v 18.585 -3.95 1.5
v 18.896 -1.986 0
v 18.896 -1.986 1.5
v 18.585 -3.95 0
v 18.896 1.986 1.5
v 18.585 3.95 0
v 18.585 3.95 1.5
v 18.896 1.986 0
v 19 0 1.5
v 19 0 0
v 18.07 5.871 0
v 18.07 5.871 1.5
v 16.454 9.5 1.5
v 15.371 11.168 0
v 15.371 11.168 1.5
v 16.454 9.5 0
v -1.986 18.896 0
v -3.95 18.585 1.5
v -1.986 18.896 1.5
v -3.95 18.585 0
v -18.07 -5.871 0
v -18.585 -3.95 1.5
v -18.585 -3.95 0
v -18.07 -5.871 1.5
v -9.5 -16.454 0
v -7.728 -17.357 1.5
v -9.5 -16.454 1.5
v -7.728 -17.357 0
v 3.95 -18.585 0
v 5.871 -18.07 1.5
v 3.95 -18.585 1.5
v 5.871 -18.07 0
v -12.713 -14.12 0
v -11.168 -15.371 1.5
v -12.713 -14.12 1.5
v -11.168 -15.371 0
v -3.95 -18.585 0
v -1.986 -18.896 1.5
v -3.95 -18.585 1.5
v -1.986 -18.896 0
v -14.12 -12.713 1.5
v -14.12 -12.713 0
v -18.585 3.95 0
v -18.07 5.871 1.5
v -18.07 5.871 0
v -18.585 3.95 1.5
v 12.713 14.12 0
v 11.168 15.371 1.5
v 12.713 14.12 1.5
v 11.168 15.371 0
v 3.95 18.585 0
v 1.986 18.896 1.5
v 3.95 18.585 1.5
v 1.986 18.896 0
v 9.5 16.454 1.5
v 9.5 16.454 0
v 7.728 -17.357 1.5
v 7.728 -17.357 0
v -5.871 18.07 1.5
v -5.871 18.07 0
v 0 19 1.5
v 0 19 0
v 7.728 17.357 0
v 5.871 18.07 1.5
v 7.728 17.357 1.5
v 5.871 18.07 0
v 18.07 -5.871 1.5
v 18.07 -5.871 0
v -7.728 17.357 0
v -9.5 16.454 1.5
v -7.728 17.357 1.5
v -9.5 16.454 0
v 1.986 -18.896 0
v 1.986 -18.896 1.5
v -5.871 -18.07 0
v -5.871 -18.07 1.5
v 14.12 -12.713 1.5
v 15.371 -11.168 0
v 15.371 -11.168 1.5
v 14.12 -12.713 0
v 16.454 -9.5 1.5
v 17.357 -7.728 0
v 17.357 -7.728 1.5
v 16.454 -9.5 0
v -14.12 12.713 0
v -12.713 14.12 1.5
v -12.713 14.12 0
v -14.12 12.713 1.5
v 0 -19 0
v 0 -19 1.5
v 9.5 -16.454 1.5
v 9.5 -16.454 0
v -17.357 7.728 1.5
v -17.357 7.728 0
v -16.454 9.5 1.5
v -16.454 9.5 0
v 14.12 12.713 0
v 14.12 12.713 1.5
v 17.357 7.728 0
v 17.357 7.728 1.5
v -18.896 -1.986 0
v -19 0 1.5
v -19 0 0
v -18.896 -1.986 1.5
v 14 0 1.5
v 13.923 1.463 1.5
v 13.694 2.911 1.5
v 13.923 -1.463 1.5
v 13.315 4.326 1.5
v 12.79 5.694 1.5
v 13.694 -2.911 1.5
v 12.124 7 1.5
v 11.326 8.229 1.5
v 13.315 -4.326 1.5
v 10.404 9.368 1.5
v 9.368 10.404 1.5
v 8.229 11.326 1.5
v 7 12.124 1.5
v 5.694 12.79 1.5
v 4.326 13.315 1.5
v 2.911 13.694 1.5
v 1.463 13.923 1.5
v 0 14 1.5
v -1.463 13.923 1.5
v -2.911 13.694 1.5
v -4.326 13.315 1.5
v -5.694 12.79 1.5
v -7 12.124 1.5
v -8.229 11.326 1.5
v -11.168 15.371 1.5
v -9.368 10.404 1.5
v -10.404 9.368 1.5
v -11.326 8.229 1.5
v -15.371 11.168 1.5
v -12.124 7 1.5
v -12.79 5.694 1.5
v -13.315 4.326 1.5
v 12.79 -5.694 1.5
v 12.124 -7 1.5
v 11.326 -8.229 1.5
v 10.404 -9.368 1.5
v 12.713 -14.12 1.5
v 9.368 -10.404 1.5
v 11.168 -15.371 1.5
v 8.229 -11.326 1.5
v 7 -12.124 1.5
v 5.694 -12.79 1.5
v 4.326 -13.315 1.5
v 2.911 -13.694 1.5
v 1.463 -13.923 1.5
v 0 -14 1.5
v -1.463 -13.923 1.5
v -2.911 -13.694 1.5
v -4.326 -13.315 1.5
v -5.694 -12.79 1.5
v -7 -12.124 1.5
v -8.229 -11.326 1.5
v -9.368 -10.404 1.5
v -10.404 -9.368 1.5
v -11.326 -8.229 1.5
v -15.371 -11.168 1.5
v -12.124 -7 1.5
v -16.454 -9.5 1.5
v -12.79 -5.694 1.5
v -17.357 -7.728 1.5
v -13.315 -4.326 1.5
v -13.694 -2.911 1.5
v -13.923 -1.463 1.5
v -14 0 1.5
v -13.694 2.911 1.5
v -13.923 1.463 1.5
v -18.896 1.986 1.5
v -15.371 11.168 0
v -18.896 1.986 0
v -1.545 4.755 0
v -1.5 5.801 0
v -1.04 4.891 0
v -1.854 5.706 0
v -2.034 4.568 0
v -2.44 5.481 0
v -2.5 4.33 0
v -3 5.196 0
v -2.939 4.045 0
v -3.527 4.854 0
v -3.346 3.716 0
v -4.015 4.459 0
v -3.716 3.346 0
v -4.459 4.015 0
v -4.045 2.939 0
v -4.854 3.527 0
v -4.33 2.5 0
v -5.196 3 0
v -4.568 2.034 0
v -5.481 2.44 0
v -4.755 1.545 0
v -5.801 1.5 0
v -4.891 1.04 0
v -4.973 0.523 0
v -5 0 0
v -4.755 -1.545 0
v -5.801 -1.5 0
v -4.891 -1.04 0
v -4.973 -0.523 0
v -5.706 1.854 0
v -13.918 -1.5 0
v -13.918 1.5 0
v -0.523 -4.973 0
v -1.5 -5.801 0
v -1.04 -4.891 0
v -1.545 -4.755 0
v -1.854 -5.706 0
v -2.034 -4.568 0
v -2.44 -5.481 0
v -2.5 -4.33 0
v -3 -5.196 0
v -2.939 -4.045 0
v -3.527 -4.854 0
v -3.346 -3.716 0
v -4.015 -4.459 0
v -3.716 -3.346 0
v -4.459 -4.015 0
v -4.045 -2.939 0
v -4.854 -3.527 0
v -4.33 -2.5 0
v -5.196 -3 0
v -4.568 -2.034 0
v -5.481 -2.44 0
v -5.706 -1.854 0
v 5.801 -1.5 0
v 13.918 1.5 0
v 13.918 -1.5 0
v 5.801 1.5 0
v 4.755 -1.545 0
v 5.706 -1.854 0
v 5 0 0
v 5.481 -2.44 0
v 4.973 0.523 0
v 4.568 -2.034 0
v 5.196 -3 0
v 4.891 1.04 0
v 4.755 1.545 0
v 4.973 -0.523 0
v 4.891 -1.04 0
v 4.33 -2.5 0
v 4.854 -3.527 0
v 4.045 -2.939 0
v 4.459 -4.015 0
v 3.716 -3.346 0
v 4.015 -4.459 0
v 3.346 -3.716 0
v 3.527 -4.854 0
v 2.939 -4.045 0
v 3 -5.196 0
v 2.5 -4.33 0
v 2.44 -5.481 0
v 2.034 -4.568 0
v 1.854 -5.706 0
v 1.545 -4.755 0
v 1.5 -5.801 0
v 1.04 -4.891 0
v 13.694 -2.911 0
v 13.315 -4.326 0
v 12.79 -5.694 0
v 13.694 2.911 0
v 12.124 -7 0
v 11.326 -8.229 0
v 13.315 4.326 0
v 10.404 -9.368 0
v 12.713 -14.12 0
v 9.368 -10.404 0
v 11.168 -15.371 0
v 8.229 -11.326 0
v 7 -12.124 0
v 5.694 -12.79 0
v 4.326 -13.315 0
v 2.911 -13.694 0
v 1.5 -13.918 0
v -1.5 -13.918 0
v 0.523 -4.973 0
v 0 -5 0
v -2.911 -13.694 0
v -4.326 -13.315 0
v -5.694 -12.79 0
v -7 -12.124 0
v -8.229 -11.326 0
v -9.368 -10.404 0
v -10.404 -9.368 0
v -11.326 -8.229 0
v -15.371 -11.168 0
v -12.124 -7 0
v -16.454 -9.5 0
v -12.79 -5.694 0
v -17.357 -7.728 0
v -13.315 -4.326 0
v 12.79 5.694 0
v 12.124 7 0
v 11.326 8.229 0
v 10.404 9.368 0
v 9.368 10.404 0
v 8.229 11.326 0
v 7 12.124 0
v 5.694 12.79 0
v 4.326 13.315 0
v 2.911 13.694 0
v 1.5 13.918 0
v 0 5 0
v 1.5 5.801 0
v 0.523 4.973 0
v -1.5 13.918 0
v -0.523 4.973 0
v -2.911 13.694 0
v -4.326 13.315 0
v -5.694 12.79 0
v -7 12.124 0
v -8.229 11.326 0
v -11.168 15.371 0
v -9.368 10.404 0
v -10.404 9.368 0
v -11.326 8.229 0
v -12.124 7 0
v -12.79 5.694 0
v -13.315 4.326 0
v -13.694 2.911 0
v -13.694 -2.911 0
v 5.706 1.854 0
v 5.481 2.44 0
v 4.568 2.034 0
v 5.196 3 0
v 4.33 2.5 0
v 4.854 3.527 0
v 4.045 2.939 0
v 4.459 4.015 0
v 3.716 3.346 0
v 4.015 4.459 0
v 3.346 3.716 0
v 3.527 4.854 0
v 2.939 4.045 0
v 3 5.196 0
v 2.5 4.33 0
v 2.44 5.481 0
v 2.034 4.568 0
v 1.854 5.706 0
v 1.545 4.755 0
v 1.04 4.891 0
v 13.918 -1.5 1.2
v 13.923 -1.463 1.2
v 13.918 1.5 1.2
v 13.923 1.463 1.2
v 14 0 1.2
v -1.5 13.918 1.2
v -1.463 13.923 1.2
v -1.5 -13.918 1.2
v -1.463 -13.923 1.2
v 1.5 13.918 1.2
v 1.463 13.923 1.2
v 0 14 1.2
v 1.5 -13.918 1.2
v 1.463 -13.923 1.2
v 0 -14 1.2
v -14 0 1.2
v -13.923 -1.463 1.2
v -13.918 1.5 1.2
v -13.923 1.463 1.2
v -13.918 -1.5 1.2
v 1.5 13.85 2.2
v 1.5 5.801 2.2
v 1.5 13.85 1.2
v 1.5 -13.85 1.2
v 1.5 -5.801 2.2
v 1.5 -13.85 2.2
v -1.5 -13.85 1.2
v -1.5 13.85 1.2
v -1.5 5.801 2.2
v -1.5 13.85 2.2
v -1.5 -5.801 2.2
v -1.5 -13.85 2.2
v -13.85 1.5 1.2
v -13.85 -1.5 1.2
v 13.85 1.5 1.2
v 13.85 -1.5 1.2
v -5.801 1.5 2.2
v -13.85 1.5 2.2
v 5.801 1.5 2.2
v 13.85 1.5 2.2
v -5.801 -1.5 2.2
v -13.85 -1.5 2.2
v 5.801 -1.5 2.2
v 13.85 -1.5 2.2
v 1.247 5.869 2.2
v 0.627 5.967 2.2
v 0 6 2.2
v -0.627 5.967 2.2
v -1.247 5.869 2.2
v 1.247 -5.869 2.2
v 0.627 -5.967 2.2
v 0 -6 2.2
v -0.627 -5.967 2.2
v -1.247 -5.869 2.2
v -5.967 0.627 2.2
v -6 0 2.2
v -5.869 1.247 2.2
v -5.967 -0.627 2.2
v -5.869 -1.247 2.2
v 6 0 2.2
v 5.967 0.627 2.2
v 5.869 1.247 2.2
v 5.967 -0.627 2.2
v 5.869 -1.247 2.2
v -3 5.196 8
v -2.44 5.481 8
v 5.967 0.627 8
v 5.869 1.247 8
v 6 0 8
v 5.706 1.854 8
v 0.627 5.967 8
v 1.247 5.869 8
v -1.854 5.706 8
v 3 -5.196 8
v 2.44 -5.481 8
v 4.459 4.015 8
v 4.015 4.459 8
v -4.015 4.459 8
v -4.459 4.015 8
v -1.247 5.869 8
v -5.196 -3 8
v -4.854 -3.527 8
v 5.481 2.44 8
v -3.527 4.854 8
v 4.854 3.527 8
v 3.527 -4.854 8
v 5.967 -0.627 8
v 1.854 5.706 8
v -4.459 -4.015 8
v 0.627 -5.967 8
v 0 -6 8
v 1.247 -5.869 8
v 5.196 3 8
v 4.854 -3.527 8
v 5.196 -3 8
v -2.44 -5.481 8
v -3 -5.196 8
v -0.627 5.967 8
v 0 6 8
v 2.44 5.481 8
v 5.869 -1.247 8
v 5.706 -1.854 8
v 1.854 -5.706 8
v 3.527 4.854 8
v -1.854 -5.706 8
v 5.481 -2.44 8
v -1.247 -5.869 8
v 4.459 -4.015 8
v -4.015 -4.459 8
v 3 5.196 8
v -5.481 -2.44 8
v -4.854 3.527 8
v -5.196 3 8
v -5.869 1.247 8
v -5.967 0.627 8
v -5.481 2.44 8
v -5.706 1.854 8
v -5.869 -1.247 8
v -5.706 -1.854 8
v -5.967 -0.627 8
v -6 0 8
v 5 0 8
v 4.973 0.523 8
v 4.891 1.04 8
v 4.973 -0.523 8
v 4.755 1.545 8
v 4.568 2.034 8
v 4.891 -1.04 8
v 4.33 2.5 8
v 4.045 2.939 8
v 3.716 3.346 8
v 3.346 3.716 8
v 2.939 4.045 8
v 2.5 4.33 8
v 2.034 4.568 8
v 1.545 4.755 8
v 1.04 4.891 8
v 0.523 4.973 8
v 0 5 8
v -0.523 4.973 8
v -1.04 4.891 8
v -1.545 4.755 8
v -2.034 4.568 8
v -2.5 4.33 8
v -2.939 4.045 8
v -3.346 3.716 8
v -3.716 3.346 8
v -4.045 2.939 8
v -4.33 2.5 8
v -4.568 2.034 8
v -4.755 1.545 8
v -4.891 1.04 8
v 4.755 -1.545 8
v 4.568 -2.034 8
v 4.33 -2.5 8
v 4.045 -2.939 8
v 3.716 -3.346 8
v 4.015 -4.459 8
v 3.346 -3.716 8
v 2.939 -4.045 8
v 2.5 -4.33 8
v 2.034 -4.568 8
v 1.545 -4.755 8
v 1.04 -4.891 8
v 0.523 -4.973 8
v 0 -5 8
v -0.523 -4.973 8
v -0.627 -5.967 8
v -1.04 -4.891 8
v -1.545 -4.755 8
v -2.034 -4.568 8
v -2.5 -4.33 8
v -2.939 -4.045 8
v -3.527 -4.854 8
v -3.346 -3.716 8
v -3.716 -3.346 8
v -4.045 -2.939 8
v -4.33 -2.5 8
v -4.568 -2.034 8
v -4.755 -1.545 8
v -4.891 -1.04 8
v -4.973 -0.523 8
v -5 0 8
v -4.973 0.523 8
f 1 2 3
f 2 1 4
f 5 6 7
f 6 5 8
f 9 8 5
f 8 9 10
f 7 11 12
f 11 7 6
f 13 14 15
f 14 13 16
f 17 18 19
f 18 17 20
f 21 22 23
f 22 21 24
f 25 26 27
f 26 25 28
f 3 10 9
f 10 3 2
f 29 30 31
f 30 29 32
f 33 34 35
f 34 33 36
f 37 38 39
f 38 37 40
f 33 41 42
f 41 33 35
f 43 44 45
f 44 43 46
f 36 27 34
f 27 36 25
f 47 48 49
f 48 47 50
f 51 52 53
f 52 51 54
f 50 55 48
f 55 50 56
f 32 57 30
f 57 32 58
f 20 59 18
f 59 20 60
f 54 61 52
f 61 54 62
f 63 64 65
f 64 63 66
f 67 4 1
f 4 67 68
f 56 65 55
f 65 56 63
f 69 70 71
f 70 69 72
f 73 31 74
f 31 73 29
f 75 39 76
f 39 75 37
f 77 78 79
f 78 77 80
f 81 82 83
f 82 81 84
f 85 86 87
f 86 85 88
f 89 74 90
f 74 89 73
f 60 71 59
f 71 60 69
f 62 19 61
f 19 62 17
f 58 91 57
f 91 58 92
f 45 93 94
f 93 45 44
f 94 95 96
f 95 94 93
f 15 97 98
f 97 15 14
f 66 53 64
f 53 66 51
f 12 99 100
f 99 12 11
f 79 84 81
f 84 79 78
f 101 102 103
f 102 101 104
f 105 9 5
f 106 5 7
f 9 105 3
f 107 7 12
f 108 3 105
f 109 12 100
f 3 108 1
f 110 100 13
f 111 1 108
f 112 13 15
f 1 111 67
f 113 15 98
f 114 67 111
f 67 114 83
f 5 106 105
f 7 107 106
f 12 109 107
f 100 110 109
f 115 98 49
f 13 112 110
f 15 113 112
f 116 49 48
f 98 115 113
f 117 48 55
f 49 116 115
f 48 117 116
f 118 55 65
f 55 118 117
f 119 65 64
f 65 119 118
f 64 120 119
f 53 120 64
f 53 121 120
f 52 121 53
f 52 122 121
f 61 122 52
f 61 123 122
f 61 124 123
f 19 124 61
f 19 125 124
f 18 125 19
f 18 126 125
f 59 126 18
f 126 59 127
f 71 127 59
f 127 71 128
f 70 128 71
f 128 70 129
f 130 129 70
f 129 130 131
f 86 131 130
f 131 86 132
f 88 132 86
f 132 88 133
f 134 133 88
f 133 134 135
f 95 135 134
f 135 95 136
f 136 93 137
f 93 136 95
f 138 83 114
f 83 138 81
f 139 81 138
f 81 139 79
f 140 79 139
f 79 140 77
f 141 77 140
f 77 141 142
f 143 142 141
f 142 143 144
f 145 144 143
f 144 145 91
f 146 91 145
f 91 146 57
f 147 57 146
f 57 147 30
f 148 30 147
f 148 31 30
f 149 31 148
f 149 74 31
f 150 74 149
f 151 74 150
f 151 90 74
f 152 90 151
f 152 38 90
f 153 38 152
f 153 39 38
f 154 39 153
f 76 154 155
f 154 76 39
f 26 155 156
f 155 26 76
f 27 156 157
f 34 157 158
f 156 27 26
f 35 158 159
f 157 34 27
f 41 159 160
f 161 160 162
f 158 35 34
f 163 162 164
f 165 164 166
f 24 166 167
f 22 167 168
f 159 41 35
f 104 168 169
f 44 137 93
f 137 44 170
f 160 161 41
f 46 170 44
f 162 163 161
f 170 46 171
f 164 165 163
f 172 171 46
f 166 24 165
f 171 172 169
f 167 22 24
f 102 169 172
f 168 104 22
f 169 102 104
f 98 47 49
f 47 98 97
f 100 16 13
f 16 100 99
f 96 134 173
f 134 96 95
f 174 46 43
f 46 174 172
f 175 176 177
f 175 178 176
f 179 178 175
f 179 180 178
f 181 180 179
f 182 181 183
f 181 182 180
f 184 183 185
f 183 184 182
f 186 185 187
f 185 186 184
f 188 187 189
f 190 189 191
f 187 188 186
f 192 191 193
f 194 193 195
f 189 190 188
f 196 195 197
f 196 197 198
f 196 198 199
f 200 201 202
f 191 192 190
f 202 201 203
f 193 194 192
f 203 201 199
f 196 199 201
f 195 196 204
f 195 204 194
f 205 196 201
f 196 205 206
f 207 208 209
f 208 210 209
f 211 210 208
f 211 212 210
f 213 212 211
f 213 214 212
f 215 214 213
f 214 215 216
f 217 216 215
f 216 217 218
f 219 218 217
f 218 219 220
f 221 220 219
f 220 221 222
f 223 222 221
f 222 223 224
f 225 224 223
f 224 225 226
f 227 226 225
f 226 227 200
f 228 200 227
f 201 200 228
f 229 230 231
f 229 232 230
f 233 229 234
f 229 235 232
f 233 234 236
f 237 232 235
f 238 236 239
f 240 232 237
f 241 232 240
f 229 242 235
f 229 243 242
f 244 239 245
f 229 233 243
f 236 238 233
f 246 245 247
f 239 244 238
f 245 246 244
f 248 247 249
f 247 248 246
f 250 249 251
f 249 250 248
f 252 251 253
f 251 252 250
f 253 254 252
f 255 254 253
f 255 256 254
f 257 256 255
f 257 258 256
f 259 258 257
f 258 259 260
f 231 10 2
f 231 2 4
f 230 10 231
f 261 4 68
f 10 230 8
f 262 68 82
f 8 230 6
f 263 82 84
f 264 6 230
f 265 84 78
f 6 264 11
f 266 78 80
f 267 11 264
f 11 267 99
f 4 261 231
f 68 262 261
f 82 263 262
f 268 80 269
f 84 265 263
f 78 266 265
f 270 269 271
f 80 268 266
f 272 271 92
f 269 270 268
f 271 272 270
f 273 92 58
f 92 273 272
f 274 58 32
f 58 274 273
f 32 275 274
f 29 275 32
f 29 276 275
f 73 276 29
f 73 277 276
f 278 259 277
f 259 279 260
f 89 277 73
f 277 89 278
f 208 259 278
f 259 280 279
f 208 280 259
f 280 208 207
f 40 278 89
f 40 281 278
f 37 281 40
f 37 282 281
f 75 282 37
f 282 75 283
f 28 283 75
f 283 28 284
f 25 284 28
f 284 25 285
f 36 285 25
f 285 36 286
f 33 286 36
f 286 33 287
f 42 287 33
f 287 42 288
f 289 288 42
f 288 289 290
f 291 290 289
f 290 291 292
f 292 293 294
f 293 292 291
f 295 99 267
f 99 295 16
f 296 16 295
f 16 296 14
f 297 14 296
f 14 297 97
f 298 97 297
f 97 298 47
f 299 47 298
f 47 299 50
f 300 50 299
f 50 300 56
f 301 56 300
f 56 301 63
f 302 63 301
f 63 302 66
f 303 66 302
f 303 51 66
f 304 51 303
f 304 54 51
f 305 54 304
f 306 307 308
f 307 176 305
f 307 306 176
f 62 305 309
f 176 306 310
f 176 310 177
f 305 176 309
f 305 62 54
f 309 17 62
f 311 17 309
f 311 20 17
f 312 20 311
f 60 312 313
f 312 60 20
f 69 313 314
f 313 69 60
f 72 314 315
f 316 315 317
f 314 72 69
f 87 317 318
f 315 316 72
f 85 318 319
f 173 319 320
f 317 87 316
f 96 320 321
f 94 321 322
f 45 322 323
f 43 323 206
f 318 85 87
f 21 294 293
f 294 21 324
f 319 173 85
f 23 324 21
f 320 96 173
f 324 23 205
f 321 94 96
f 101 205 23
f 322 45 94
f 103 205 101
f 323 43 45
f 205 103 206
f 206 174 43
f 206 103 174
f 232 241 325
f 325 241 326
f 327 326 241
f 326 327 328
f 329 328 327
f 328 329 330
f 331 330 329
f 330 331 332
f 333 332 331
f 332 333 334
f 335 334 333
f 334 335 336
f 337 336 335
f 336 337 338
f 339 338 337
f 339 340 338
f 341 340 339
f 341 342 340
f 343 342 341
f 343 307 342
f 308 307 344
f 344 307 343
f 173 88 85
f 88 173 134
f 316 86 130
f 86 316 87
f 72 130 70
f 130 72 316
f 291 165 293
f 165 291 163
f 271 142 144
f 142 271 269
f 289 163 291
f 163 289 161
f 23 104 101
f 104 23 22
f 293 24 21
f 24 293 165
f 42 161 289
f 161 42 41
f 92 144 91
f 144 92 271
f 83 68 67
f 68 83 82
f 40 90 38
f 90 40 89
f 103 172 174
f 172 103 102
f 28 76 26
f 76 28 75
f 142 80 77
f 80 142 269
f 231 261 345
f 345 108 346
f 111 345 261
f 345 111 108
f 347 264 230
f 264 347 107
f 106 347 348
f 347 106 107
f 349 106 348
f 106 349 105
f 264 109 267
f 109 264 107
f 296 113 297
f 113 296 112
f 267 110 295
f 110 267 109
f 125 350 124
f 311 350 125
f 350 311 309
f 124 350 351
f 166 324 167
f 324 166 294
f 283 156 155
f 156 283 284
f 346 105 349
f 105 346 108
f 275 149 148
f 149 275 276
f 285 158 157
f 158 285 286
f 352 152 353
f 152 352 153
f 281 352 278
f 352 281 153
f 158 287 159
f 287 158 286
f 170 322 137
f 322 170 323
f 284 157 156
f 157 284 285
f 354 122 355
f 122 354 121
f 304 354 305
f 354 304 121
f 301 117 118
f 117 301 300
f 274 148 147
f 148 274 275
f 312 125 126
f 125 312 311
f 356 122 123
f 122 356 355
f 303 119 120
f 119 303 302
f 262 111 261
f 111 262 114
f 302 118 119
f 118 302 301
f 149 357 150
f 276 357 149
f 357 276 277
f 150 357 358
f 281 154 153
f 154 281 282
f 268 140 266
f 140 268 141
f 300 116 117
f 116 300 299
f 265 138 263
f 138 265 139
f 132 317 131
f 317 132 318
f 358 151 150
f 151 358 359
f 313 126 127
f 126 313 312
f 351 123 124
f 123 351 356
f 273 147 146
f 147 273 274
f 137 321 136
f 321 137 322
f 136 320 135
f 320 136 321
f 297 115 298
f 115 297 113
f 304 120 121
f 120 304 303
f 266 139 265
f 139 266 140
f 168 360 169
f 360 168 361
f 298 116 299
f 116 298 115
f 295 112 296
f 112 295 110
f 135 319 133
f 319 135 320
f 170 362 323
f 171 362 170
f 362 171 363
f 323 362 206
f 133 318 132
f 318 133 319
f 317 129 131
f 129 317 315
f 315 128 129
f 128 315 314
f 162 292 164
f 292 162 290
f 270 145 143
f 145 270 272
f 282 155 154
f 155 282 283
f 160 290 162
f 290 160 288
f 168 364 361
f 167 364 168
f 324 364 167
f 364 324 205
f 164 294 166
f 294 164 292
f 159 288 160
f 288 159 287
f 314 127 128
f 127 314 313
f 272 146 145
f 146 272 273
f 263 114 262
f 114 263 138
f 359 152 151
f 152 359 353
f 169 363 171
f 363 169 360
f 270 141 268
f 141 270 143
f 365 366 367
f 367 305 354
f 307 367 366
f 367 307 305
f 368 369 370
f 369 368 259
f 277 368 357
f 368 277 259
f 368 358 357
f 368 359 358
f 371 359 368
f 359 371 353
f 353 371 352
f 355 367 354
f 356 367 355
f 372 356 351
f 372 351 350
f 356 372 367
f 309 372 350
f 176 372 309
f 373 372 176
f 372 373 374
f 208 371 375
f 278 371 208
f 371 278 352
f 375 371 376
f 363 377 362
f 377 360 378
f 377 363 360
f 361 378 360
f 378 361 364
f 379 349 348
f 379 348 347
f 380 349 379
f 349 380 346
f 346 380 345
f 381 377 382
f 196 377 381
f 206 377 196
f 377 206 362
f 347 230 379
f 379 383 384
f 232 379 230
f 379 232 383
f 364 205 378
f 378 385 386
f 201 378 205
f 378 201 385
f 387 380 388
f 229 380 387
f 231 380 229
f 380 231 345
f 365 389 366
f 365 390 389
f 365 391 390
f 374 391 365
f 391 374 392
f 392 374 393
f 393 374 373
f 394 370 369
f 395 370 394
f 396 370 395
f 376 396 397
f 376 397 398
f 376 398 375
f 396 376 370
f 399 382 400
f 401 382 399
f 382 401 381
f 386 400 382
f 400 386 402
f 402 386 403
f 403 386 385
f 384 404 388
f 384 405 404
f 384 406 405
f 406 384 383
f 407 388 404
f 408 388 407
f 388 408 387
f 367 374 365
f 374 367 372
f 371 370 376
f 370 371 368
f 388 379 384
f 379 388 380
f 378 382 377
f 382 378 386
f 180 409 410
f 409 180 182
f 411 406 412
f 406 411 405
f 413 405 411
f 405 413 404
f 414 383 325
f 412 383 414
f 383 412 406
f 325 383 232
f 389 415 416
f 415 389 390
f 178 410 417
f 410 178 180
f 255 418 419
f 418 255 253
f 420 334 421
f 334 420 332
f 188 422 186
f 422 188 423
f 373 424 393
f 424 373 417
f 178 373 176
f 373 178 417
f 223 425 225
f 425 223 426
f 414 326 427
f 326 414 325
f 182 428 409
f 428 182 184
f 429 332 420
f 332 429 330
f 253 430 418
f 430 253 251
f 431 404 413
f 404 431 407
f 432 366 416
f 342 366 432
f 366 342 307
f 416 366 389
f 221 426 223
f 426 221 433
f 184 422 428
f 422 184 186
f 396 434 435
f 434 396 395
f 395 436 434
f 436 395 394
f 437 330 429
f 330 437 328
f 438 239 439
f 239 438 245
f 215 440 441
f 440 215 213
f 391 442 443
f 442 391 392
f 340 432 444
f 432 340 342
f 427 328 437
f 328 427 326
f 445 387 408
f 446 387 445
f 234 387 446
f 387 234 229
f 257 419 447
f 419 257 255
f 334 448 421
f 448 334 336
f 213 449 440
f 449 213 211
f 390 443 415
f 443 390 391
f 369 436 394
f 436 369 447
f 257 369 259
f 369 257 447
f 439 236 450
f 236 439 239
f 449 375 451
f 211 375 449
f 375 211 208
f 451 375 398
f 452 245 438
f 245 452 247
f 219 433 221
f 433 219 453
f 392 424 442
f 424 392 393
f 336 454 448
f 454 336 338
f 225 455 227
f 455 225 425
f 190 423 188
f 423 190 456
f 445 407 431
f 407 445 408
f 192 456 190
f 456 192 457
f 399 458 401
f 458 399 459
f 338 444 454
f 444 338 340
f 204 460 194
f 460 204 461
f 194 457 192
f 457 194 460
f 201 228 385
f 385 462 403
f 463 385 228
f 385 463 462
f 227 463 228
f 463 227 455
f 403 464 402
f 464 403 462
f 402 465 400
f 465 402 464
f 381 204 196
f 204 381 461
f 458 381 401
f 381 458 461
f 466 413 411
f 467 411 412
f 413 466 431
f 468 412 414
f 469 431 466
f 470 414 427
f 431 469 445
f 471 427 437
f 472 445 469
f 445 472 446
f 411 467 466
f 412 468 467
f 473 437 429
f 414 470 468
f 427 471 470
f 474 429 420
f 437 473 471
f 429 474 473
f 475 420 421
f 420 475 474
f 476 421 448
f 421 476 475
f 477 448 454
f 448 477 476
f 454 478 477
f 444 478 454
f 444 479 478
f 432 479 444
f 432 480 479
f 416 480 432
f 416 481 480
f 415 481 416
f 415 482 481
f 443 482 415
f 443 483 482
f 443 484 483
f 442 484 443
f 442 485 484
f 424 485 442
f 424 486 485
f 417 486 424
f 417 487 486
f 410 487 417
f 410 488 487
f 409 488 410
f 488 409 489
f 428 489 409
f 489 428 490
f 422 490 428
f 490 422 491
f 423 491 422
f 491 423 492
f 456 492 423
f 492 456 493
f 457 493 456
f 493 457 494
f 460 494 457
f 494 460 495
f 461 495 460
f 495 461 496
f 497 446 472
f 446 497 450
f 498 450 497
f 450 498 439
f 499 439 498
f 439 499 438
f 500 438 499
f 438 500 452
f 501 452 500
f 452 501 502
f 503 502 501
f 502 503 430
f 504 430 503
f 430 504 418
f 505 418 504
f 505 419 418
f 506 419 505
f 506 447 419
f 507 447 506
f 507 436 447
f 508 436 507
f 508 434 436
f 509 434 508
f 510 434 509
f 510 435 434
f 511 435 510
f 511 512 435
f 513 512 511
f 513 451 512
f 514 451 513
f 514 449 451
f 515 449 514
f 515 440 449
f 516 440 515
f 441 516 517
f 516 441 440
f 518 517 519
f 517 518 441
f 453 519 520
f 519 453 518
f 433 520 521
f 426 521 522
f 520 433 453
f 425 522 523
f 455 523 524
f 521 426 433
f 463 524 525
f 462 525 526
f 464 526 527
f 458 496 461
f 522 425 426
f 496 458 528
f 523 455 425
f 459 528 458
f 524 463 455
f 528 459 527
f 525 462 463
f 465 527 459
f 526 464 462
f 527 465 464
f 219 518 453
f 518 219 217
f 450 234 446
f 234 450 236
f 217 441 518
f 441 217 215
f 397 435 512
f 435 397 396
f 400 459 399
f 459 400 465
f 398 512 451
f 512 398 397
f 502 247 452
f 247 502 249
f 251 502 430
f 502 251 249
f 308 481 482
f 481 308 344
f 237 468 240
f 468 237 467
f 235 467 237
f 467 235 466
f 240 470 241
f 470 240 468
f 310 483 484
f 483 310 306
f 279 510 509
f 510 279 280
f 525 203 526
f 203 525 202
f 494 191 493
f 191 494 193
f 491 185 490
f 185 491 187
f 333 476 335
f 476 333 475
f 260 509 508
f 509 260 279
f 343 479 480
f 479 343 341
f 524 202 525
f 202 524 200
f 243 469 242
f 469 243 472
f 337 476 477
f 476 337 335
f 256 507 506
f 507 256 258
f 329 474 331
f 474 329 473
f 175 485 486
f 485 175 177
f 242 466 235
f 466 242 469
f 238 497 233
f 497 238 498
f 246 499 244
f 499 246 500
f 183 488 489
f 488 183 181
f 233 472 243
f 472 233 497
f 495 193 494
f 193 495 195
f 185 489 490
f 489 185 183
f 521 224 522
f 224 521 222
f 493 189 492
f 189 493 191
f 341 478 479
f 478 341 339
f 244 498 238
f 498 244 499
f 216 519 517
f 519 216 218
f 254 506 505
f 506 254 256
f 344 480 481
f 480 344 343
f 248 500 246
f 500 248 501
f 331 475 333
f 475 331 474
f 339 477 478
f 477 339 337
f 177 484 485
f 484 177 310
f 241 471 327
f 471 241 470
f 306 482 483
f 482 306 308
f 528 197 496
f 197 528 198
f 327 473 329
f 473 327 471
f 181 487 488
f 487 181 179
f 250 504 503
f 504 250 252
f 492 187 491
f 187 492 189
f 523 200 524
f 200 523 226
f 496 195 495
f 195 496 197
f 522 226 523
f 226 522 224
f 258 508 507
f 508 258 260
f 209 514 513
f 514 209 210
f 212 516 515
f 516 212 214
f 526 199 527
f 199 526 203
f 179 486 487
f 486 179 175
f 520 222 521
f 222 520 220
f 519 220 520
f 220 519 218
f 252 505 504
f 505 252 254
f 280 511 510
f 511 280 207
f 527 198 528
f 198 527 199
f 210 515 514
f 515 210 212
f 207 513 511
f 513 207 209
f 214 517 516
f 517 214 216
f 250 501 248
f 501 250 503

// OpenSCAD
difference(){
cylinder(d=38,h=1.5,$fn=60);
translate([0,0,-1])cylinder(d=28,h=3.5,$fn=60);
}
difference(){
union(){
translate([-1.5,-15,0])cube([3,30,1.2]);
translate([-15,-1.5,0])cube([30,3,1.2]);
translate([-1.5,-27.7/2,0])cube([3,27.7,2.2]);
translate([-27.7/2,-1.5,0])cube([27.7,3,2.2]);
cylinder(d=12,h=8,$fn=60);
}
translate([0,0,-1])cylinder(d=10,h=12,$fn=60);
}
